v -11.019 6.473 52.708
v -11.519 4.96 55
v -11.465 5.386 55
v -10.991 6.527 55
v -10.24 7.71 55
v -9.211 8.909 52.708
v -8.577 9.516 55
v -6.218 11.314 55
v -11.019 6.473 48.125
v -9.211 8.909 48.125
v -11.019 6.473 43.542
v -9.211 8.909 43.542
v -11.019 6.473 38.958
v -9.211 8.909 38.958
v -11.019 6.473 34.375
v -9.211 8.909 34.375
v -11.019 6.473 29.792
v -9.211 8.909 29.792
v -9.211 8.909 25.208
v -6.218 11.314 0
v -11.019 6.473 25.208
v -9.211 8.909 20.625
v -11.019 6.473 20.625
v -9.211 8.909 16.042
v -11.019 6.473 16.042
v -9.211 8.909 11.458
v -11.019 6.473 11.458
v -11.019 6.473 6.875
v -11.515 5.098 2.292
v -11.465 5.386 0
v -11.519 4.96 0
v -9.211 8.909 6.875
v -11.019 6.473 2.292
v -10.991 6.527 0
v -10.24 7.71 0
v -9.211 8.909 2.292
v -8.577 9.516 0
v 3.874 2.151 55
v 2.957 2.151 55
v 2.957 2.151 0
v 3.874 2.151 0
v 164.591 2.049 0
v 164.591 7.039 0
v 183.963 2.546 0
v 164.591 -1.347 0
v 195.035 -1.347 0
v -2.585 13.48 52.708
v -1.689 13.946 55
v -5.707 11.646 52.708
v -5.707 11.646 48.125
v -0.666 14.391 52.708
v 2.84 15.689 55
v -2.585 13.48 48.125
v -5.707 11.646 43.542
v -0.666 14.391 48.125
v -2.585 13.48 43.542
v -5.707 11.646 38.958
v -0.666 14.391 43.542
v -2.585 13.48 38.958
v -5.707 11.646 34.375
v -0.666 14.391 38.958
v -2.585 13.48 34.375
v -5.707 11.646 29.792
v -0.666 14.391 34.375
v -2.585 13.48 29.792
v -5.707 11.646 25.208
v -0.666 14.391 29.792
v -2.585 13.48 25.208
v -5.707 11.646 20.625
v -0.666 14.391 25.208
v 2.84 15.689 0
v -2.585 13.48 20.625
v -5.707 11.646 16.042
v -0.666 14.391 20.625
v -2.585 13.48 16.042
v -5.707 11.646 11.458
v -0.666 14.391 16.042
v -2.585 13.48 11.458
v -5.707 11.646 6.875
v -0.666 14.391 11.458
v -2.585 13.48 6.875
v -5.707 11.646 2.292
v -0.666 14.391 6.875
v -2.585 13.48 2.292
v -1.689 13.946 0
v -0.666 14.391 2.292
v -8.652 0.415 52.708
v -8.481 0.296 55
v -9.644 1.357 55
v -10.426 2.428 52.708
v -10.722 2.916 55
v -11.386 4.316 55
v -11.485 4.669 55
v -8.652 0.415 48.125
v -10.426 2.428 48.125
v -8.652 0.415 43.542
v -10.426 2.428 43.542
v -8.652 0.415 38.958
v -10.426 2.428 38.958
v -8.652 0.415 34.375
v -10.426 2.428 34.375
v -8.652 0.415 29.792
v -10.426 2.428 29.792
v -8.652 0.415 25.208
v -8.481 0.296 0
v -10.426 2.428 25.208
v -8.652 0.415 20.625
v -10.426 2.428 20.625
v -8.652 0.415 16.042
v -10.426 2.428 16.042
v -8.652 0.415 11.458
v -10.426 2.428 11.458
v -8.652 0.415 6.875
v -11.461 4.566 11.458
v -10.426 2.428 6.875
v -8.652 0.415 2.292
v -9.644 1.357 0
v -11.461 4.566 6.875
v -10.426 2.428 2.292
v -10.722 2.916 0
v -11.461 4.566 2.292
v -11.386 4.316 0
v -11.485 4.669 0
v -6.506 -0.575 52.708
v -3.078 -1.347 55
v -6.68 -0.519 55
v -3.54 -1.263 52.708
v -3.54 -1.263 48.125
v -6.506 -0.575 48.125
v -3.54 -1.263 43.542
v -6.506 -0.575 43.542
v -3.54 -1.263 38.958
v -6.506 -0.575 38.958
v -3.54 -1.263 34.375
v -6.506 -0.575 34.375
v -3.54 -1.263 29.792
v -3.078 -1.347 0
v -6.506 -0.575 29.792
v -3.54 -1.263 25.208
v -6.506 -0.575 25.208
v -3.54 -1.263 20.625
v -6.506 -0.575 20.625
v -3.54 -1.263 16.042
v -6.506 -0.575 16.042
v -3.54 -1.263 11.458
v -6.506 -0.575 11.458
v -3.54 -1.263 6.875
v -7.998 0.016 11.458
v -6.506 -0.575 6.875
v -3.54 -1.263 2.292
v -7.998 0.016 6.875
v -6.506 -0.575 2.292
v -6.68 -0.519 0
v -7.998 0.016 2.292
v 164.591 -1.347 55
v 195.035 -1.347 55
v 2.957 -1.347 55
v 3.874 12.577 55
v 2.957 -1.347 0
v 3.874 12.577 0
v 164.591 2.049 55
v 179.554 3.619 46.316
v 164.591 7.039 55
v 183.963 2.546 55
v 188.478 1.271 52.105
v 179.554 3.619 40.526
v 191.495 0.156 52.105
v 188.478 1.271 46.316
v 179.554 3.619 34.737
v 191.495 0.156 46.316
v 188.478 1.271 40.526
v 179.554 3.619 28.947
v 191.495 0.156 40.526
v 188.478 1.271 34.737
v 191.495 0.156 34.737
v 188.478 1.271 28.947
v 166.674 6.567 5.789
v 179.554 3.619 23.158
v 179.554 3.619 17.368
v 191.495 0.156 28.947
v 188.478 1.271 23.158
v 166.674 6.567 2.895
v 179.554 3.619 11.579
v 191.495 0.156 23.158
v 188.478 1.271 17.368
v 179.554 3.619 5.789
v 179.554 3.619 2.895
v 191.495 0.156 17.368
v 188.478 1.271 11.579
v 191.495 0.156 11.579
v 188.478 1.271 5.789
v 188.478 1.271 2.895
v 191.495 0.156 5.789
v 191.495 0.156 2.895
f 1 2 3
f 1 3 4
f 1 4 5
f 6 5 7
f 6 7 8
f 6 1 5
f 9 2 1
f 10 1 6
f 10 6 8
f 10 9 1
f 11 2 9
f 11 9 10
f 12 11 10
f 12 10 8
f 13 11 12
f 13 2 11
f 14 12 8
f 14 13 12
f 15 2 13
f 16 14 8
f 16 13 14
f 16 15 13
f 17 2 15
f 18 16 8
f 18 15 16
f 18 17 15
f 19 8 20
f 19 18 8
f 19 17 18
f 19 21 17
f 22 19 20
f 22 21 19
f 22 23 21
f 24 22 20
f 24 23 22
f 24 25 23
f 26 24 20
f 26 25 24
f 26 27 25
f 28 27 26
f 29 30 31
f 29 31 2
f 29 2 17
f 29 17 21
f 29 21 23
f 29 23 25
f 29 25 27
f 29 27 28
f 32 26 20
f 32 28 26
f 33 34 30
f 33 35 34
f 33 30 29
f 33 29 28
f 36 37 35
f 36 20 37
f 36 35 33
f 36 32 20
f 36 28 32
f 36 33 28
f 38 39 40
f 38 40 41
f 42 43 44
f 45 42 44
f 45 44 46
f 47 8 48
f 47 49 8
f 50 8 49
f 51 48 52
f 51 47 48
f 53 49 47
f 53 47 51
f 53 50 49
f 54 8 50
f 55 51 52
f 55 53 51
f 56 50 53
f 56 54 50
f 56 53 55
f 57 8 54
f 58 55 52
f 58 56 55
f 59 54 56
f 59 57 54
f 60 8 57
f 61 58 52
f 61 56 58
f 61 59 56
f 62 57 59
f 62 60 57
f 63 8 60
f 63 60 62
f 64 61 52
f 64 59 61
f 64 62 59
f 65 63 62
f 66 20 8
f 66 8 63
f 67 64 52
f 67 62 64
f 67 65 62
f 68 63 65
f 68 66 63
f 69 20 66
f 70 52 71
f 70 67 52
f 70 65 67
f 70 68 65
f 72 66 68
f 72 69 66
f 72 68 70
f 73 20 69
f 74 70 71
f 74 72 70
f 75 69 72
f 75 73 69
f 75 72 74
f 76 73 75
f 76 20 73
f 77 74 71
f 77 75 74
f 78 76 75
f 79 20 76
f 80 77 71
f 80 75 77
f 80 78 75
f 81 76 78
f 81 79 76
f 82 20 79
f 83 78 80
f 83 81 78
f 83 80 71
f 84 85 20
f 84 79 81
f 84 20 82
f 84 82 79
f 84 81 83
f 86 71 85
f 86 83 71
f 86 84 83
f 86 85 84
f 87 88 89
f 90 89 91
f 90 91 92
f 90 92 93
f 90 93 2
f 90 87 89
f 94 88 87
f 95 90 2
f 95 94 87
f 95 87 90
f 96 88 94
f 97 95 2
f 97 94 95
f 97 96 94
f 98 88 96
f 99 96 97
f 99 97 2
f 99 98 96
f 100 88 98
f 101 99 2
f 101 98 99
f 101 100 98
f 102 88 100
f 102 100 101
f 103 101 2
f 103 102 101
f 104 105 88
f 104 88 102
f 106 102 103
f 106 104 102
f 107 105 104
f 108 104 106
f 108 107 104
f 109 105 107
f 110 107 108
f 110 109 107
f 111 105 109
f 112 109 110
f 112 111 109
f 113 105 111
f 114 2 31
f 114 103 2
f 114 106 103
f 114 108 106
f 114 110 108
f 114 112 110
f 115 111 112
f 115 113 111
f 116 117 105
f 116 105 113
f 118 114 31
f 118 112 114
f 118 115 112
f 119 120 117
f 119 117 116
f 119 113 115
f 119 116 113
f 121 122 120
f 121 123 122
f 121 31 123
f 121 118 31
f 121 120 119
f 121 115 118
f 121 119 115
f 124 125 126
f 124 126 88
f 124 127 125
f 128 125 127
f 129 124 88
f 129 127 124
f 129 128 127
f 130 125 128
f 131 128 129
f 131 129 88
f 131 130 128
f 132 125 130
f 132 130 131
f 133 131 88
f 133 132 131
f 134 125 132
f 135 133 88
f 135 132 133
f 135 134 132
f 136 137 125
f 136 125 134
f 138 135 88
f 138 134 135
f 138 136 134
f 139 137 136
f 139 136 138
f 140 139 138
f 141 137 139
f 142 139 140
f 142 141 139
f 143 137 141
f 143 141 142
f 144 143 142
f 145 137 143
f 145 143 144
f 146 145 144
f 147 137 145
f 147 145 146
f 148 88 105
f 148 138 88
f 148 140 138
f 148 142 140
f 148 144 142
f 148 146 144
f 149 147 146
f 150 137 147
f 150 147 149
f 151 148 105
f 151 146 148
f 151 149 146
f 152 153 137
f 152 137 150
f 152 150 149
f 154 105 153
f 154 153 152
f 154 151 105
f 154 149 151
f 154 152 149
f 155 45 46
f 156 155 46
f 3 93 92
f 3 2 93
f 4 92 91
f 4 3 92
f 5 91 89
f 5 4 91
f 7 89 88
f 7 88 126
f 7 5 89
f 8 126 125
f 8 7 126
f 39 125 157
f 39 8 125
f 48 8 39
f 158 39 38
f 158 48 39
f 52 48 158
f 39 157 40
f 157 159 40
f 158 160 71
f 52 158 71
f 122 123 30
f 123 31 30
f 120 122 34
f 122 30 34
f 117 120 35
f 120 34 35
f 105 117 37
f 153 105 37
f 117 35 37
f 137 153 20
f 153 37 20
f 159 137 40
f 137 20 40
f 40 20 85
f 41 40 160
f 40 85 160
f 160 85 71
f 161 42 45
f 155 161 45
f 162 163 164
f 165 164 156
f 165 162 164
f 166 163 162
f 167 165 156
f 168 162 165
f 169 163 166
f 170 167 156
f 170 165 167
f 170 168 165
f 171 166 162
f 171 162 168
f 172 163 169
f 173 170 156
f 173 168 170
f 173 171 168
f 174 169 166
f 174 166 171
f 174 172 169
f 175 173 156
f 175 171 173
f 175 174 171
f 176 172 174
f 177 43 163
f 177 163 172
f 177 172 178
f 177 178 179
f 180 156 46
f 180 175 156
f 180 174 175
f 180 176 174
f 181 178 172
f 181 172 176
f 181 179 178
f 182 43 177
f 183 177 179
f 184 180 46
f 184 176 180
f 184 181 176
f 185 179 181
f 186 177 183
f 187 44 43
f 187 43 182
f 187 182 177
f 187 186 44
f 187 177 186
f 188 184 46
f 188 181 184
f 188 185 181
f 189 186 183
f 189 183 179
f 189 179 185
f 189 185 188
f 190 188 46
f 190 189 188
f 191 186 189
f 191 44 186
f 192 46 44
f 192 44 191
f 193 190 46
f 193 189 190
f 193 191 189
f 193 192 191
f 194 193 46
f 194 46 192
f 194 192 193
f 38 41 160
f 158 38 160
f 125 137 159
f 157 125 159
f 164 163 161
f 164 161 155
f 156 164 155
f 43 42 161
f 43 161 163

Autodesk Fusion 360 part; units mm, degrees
sketch "Sketch1" plane through (0, 0, 0) normal (0, 0, 1) x (1, 0, 0) in component "Airfoil structure"
  spline S0 degree 5 poles (152.7645, 9.7049) (152.9716, 9.6615) (153.4494, 9.5595) (154.3565, 9.3601) (155.9477, 9.0023) (158.563, 8.408) (161.765, 7.6797) (165.4684, 6.8398) (169.5125, 5.9246) (173.6689, 4.9817) (177.6907, 4.06) (181.3486, 3.2014) (184.473, 2.4316) (186.9959, 1.7512) (188.9984, 1.125) (190.7574, 0.4718) (192.2494, -0.1494) (193.5536, -0.7078) (194.5245, -1.1262) (195.0353, -1.3469) knots 0 0 0 0 0 0 0.066667 0.133333 0.2 0.266667 0.333333 0.4 0.466667 0.533333 0.6 0.666667 0.733333 0.8 0.866667 0.933333 1 1 1 1 1 1
  line L0 (151.6776, 9.9322) -> (153.8514, 9.4775)
  line L1 (191.9867, -0.0294) -> (198.0838, -2.6644)
  circle A0 centre (33.1388, 9.1296) radius 4.765
  circle A1 centre (116.1615, 7.0362) radius 3.175
  spline S1 degree 5 poles (-3.078, -1.3469) (-3.5988, -1.2541) (-4.5389, -1.0768) (-5.6443, -0.8357) (-6.5925, -0.5673) (-7.3281, -0.2956) (-8.0506, 0.0085) (-9.0186, 0.5701) (-10.0677, 1.7864) (-10.9637, 3.2509) (-11.5101, 4.486) (-11.5777, 5.0948) (-11.4072, 5.6425) (-11.0115, 6.6062) (-10.1312, 7.9923) (-8.6029, 9.6425) (-6.4042, 11.2716) (-4.197, 12.5713) (-2.7351, 13.406) (-1.8317, 13.8945) (-1.0217, 14.2663) (0.0954, 14.6934) (1.4589, 15.1916) (2.6392, 15.6172) (3.2971, 15.8534) knots 0 0 0 0 0 0 0.05 0.1 0.15 0.2 0.25 0.3 0.35 0.4 0.45 0.5 0.55 0.6 0.65 0.7 0.75 0.8 0.85 0.9 0.95 1 1 1 1 1 1
  line L2 (0.5733, -1.9976) -> (-6.7293, -0.6962)
  line L3 (-0.0118, 14.6656) -> (6.606, 17.0412)
  line L4 (-8.4792, 9.8153) -> (-3.9569, 12.8132)
  line L5 (-11.5034, 4.2257) -> (-11.5345, 5.6935)
  line L6 (-7.2174, -0.5359) -> (-9.7443, 1.1286)
  line L7 (19.5688, 19.3646) -> (90.5688, 19.3646)
  spline S2 degree 5 poles (93.5688, 19.3646) (93.8188, 19.3387) (94.2829, 19.2905) (94.8714, 19.229) (95.4658, 19.1659) (96.0263, 19.1049) (96.567, 19.0445) (97.2368, 18.9678) (98.1315, 18.8622) (99.313, 18.7173) (100.8214, 18.5245) (102.3118, 18.3263) (103.5973, 18.1504) (104.53, 18.0207) (105.0153, 17.9528) knots 0 0 0 0 0 0 0.1 0.2 0.3 0.4 0.5 0.6 0.7 0.8 0.9 1 1 1 1 1 1
  line L8 (92.266, 19.4996) -> (94.8715, 19.2297)
  line L9 (103.6448, 18.1447) -> (106.3858, 17.761)
  spline S3 degree 5 poles (6.5765, 16.943) (6.9079, 17.0449) (7.5374, 17.2364) (8.3817, 17.4868) (9.3156, 17.7508) (10.2084, 17.9865) (10.8922, 18.156) (11.4504, 18.29) (11.9864, 18.4184) (12.6265, 18.5675) (13.504, 18.76) (14.4962, 18.9637) (15.447, 19.1503) (16.1786, 19.2906) (16.5688, 19.3646) knots 0 0 0 0 0 0 0.1 0.2 0.3 0.4 0.5 0.6 0.7 0.8 0.9 1 1 1 1 1 1
  line L10 (5.4107, 16.5846) -> (7.7424, 17.3015)
  line L11 (15.2328, 19.111) -> (17.9048, 19.6183)
  line L12 (152.2841, 9.8053) -> (152.7645, 9.7049)
  line L13 (107.9851, 17.5282) -> (108.4359, 17.4637)
  line L14 (6.1441, 16.7993) -> (6.5765, 16.943)
  line L15 (128.8618, -1.3469) -> (132.3168, -1.3469)
  line L16 (149.3476, 10.4194) -> (148.7335, 7.483)
  line L17 (148.7335, 7.483) -> (151.67, 6.8689)
  line L18 (151.67, 6.8689) -> (152.2841, 9.8053)
  line L19 (3.2971, 15.8534) -> (4.243, 13.0064)
  line L20 (4.243, 13.0064) -> (7.09, 13.9524)
  line L21 (7.09, 13.9524) -> (6.1441, 16.7993)
  line L22 (161.1951, -1.3469) -> (161.1951, 1.6531)
  line L23 (161.1951, 1.6531) -> (164.1951, 1.6531)
  line L24 (164.1951, 1.6531) -> (164.1951, -1.3469)
  line L25 (132.3168, -1.3469) -> (161.1951, -1.3469)
  line L26 (164.1951, -1.3469) -> (195.0353, -1.3469)
  line L27 (3.4543, -1.3469) -> (3.4543, 1.6531)
  line L28 (3.4543, 1.6531) -> (6.4543, 1.6531)
  line L29 (6.4543, 1.6531) -> (6.4543, -1.3469)
  line L30 (-3.078, -1.3469) -> (3.4543, -1.3469)
  line L31 (6.4543, -1.3469) -> (128.8618, -1.3469)
  line L32 (105.0153, 17.9528) -> (107.9851, 17.5282)
  line L33 (19.5688, 19.3646) -> (19.5688, 16.3646)
  line L34 (19.5688, 16.3646) -> (16.5688, 16.3646)
  line L35 (16.5688, 16.3646) -> (16.5688, 19.3646)
  line L36 (90.5688, 19.3646) -> (90.5688, 16.3646)
  line L37 (90.5688, 16.3646) -> (93.5688, 16.3646)
  line L38 (93.5688, 16.3646) -> (93.5688, 19.3646)
  line L39 (113.7881, 13.5683) -> (110.8279, 14.0557)
  line L40 (110.8279, 14.0557) -> (111.3153, 17.0159)
  line L41 (113.7881, 13.5683) -> (114.2755, 16.5285)
  spline S4 degree 5 poles (108.4359, 17.4637) (108.5255, 17.4506) (108.6943, 17.4261) (108.916, 17.394) (109.1532, 17.3597) (109.3785, 17.3272) (109.5651, 17.2997) (109.7467, 17.2719) (109.9518, 17.2393) (110.199, 17.1992) (110.5008, 17.1497) (110.7926, 17.1018) (111.0419, 17.0608) (111.2219, 17.0312) (111.3153, 17.0159) knots 0 0 0 0 0 0 0.1 0.2 0.3 0.4 0.5 0.6 0.7 0.8 0.9 1 1 1 1 1 1
  line L42 (107.9387, 17.5361) -> (108.933, 17.3913)
  line L43 (110.8712, 17.0888) -> (111.7595, 16.9429)
  spline S5 degree 5 poles (114.2755, 16.5285) (114.908, 16.4243) (116.2157, 16.2103) (118.305, 15.8728) (121.3361, 15.3892) (125.4662, 14.728) (129.833, 14.0131) (134.2929, 13.2559) (138.6571, 12.4806) (142.6792, 11.7322) (146.0525, 11.0804) (147.9853, 10.6961) (148.8914, 10.5134) (149.2384, 10.4423) (149.3476, 10.4194) knots 0 0 0 0 0 0 0.1 0.2 0.3 0.4 0.5 0.6 0.7 0.8 0.9 1 1 1 1 1 1
  line L44 (111.4536, 16.9935) -> (117.0973, 16.0636)
  line L45 (148.6356, 10.5684) -> (150.0597, 10.2705)
  line L46 (151.67, 6.8689) -> (155.718, 6.0223) construction
  line L47 (164.1951, 1.6531) -> (164.6963, 1.6531) construction
  line L48 (152.6756, 9.7234) -> (152.0615, 6.787)
  line L49 (164.1951, 1.6531) -> (164.9867, 2.4447) construction
  line L50 (164.1951, 1.6531) -> (164.8816, 1.6531) construction
  line L51 (164.5909, 2.0489) -> (164.5909, -1.3469)
  line L52 (152.2841, 9.8053) -> (152.6756, 9.7234) construction
  line L53 (152.6756, 9.7234) -> (151.9827, 6.4137) construction
  line L54 (151.5912, 6.4957) -> (152.2841, 9.8053) construction
  line L55 (152.2841, 9.8053) -> (152.6756, 9.7234)
  line L56 (152.6756, 9.7234) -> (151.9342, 6.1818)
  line L57 (151.9342, 6.1818) -> (151.5427, 6.2638) construction
  line L58 (151.5427, 6.2638) -> (152.2841, 9.8053)
  line L59 (2.9567, -1.3469) -> (2.9567, 2.1507)
  line L60 (2.9567, 2.1507) -> (3.8737, 2.1507)
  line L61 (3.8737, 2.1507) -> (3.8737, 12.5773)
  line L62 (3.8737, 12.5773) -> (2.8398, 15.6891)
  line L63 (4.243, 13.0064) -> (1.9707, 12.2515) construction
  line L64 (3.4543, 1.6531) -> (2.143, 2.9644) construction
  line L65 (3.4543, 1.6531) -> (5.3087, 1.6531) construction
  line L66 (164.5909, 2.0489) -> (152.0615, 6.787)
  line L67 (151.67, 6.8689) -> (152.3309, 5.404) construction
  line L68 (151.5764, 6.4249) -> (164.1951, 1.6531)
  line L69 (164.5909, 2.0489) -> (164.5909, 7.0392)
  point P0 (-8.4808, 0.2964)
  point P1 (-11.5189, 4.9596)
  point P2 (-6.2181, 11.3142)
  point P3 (11.4183, 18.2822)
  point P4 (96.5722, 19.0435)
  point P5 (109.7229, 17.2753)
  point P6 (137.8507, 12.6179)
  point P7 (163.7235, 7.2358)
  point P8 (186.7896, 1.7868)
  dimension "d38" = 77
  dimension "d53" = 9.53
  dimension "d54" = 6.35
  dimension "d59" = 3
  dimension "d65" = 0.4
  dimension "d68" = 3
  dimension "d69" = 3
  dimension "d73" = 45
  dimension "d81" = 135
  dimension "d82" = 3
  dimension "d83" = 3
  dimension "d88" = 45
extrude "Extrude4" add sketch "Sketch1" along normal blind 77.78 contours S1 L30 L59 L60 L61 L62 makes body 1 in component "Airfoil structure"
extrude "Extrude3" add sketch "Sketch1" along normal blind 77.78 separate body contours S0 L26 L51 L69 makes body 2
extrude "Extrude5" cut 1 faces at (-2.1131, 4.0393, 77.78) along direction (0, 0, -1) blind 22.78 on bodies 1 bodies 1 in component "Airfoil structure"
extrude "Extrude4'" cut 1 faces at (171.0483, 3.878, 77.78) along direction (0, 0, -1) blind 22.78 on bodies 2 bodies 2
extrude "Extrude3'" [suppressed] in component "Airfoil structure"
sketch "Sketch3" plane through (0, 0, 0) normal (0, 0, 1) x (1, 0, 0)
component "Airfoil structure" placed x (1, 0, 0) y (0, 1, 0) z (0, 0, 1) at (0, 0, 0)
